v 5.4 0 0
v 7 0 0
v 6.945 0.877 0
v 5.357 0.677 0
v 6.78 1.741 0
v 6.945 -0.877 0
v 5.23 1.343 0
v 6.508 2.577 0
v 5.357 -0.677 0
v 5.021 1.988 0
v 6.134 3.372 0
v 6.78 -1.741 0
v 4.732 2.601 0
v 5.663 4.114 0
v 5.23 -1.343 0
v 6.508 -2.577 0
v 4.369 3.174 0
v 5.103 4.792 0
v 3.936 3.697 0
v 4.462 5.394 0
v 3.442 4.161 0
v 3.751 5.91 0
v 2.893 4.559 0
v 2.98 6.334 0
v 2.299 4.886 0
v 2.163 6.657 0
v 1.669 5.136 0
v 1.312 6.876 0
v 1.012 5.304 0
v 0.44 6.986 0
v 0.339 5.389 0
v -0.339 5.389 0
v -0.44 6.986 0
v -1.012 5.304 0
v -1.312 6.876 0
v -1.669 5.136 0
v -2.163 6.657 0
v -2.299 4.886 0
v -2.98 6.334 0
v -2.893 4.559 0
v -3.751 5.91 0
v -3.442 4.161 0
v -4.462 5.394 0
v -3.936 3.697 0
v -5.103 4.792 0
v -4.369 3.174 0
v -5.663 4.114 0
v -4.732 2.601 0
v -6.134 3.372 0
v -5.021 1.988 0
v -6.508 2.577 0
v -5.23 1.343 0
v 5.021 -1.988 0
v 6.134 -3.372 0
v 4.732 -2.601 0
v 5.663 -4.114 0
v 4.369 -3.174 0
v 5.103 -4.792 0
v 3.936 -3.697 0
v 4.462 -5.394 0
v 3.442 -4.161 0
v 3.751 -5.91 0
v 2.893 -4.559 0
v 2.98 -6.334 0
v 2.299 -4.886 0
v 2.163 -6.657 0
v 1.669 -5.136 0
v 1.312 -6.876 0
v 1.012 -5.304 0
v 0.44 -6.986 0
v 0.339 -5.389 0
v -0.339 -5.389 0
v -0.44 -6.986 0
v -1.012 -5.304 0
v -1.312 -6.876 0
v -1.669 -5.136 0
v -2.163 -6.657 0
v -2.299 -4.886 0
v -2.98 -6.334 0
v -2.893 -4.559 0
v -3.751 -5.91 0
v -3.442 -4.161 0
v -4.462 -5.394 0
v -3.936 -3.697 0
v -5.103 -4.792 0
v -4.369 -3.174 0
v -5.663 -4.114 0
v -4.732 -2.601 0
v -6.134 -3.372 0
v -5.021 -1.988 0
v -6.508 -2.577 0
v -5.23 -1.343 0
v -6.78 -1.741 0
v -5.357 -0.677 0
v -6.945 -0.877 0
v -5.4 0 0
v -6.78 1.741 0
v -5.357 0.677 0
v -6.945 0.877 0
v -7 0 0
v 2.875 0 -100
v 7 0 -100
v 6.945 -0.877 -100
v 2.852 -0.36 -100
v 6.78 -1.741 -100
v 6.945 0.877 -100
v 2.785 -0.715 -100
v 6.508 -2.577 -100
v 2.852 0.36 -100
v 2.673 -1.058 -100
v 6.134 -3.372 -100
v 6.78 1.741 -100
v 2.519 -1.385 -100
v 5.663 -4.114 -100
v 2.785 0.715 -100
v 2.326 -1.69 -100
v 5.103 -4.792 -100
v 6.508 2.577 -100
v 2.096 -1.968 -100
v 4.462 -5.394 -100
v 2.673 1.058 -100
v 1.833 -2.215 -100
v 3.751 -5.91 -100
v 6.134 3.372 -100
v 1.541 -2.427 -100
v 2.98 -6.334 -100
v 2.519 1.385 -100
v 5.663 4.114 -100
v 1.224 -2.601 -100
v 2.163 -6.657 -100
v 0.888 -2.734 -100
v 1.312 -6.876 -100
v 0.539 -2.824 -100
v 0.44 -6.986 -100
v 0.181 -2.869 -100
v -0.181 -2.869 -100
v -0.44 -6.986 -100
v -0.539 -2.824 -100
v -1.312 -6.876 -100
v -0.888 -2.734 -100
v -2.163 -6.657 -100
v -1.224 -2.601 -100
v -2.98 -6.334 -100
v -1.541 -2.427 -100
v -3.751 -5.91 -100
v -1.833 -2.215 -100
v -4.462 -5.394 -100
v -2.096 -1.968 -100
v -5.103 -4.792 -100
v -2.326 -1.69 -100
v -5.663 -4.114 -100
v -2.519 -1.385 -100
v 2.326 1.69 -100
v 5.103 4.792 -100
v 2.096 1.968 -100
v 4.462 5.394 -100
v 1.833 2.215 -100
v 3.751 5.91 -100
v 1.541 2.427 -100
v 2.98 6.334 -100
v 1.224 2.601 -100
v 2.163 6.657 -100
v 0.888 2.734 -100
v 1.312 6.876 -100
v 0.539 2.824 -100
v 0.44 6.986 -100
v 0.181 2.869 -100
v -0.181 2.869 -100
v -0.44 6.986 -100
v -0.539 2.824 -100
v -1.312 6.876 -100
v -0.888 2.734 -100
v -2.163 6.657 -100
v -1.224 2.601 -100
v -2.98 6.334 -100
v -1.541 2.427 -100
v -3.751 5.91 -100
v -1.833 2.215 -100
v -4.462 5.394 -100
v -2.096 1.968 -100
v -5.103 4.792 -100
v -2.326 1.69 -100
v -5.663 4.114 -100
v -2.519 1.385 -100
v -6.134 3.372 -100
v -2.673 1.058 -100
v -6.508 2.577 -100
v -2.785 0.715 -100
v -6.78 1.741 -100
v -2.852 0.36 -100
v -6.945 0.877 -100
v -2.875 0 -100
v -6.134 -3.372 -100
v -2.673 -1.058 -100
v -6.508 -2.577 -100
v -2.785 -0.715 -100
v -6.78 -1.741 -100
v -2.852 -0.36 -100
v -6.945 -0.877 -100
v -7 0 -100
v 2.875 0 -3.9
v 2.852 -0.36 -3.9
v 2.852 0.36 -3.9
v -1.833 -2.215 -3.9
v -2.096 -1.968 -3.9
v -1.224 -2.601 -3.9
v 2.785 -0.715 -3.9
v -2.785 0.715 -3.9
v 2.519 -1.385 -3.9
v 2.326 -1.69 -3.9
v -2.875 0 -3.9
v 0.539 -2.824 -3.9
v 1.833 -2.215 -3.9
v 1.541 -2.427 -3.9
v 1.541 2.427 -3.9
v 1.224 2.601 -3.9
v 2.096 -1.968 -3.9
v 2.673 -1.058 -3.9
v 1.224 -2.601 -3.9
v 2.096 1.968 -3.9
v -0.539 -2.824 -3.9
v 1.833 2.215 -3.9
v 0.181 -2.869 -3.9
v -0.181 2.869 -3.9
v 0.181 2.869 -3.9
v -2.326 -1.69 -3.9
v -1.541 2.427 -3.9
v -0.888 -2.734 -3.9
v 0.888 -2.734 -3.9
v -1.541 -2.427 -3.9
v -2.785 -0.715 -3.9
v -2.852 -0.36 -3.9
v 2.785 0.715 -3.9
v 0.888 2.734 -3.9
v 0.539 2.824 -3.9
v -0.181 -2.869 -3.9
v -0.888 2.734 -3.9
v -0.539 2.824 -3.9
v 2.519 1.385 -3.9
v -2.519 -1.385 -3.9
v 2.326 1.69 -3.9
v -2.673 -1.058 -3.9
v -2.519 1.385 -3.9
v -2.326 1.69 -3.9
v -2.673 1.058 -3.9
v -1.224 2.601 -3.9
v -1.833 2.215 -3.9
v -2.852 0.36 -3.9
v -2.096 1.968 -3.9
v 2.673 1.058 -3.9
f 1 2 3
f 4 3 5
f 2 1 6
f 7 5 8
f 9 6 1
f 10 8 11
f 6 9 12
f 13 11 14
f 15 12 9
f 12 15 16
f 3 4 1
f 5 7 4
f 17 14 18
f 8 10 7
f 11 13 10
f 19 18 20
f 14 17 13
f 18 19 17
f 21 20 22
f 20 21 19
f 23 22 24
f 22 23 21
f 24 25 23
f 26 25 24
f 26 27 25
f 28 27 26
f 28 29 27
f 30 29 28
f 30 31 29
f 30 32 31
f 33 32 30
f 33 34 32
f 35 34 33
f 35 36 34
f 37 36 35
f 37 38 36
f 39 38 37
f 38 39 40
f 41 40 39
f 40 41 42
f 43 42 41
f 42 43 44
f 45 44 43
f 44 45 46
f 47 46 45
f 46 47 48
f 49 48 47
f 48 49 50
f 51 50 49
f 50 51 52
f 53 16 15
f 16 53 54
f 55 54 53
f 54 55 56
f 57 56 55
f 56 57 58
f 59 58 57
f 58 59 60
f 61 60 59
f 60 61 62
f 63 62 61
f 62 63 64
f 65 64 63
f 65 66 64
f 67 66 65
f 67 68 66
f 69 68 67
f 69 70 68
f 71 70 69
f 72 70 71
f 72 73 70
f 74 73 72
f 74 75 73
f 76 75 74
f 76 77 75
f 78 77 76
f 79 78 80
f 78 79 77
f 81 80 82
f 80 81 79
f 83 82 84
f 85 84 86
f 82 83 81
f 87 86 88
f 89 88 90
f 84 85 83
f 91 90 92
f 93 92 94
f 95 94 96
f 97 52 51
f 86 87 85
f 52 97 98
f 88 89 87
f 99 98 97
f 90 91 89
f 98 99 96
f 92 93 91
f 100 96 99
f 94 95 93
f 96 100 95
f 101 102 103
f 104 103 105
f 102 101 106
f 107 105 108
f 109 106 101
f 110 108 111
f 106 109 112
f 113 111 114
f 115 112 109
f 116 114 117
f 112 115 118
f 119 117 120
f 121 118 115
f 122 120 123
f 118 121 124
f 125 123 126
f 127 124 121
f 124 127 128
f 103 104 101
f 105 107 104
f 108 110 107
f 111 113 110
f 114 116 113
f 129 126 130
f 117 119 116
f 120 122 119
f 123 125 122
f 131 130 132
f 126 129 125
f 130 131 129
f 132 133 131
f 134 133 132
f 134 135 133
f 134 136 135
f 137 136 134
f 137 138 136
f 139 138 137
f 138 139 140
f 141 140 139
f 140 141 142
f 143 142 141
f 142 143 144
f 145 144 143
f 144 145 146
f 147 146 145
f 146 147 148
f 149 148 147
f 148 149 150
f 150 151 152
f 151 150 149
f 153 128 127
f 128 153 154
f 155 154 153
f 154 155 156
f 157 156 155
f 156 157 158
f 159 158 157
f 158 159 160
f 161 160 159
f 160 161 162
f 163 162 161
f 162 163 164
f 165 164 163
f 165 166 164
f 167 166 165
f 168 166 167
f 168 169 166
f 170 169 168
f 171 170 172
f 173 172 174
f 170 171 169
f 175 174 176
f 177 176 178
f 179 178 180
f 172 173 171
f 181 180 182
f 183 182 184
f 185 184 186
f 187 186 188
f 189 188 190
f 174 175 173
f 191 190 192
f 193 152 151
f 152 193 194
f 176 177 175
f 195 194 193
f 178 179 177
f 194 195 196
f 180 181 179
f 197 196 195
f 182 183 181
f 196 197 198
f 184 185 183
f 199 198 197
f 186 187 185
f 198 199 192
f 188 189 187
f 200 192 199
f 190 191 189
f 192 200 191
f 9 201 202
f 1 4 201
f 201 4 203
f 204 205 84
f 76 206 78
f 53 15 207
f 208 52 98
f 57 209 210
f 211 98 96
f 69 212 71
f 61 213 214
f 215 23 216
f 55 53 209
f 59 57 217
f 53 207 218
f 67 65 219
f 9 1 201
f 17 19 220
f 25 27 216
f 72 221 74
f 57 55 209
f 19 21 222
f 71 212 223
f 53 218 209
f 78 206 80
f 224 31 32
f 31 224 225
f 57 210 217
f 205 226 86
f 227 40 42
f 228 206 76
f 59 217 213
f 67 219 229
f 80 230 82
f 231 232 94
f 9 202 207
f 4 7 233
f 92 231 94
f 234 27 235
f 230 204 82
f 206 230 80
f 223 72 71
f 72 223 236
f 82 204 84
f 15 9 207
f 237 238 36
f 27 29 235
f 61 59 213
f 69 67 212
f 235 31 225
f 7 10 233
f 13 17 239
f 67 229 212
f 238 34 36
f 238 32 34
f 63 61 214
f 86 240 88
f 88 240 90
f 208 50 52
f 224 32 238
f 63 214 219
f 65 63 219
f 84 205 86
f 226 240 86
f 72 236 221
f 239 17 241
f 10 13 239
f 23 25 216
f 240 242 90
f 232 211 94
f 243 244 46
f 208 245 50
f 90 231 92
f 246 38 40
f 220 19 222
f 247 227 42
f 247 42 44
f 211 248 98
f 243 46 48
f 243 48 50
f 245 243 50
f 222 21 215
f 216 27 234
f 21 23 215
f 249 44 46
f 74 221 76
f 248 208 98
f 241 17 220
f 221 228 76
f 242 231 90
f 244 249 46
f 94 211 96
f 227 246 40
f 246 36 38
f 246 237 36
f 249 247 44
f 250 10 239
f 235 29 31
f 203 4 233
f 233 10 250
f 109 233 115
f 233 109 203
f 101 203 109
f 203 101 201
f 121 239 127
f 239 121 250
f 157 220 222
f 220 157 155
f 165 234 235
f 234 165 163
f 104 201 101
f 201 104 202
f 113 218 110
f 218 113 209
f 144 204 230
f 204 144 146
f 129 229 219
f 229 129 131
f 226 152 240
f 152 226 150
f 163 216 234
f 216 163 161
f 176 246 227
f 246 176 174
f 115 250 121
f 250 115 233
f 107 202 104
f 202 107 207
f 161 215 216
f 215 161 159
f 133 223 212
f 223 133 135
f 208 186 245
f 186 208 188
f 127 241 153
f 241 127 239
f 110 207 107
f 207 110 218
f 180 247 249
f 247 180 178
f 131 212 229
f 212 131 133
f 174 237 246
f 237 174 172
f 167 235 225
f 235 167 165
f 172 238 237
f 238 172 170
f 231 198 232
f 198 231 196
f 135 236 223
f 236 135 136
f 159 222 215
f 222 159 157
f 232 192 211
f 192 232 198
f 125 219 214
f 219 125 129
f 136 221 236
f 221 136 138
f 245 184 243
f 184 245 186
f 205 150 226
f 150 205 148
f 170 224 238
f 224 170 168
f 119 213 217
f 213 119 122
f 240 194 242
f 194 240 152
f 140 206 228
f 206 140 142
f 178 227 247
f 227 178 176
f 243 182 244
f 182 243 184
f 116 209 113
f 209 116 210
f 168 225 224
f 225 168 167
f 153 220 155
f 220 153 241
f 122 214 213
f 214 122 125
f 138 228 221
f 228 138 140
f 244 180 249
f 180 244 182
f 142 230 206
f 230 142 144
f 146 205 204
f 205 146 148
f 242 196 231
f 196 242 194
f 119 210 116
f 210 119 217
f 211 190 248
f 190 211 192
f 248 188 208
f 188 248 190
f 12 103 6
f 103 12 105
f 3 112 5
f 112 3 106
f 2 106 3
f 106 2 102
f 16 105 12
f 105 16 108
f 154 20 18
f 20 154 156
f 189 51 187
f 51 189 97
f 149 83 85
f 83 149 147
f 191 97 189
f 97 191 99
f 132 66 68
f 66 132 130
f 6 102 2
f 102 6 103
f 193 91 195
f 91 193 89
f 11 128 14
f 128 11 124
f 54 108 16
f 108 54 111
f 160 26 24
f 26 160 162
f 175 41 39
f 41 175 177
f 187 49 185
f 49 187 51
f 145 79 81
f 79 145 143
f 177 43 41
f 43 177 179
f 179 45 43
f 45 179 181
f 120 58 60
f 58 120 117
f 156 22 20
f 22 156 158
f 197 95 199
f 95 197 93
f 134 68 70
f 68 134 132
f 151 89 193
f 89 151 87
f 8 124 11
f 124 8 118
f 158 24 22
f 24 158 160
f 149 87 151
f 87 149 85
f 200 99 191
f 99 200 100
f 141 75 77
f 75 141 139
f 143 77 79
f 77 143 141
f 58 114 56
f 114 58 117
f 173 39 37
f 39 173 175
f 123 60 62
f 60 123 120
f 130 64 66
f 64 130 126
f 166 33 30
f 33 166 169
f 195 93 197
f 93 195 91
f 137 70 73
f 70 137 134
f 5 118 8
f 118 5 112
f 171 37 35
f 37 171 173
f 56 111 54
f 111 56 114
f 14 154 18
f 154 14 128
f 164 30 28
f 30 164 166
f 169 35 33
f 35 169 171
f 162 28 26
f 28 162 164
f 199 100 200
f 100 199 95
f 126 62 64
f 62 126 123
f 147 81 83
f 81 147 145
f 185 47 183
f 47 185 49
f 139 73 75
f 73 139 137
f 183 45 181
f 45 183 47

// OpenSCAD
$fn = 50;


difference() {
	union() {
		translate(v = [0, 0, -100.0000000000]) {
			cylinder(h = 100, r = 7.0000000000);
		}
		cylinder(h = 0, r = 17.0000000000);
	}
	union() {
		translate(v = [0, 0, 0]) {
			rotate(a = [0, 0, 0]) {
				difference() {
					union() {
						#translate(v = [0, 0, -100.0000000000]) {
							cylinder(h = 100, r = 2.6000000000);
						}
						#translate(v = [0, 0, -3.9000000000]) {
							cylinder(h = 3.9000000000, r1 = 2.8750000000, r2 = 5.4000000000);
						}
						#translate(v = [0, 0, -100.0000000000]) {
							cylinder(h = 100, r = 2.8750000000);
						}
						#translate(v = [0, 0, -100.0000000000]) {
							cylinder(h = 100, r = 2.6000000000);
						}
					}
					union();
				}
			}
		}
	}
}
